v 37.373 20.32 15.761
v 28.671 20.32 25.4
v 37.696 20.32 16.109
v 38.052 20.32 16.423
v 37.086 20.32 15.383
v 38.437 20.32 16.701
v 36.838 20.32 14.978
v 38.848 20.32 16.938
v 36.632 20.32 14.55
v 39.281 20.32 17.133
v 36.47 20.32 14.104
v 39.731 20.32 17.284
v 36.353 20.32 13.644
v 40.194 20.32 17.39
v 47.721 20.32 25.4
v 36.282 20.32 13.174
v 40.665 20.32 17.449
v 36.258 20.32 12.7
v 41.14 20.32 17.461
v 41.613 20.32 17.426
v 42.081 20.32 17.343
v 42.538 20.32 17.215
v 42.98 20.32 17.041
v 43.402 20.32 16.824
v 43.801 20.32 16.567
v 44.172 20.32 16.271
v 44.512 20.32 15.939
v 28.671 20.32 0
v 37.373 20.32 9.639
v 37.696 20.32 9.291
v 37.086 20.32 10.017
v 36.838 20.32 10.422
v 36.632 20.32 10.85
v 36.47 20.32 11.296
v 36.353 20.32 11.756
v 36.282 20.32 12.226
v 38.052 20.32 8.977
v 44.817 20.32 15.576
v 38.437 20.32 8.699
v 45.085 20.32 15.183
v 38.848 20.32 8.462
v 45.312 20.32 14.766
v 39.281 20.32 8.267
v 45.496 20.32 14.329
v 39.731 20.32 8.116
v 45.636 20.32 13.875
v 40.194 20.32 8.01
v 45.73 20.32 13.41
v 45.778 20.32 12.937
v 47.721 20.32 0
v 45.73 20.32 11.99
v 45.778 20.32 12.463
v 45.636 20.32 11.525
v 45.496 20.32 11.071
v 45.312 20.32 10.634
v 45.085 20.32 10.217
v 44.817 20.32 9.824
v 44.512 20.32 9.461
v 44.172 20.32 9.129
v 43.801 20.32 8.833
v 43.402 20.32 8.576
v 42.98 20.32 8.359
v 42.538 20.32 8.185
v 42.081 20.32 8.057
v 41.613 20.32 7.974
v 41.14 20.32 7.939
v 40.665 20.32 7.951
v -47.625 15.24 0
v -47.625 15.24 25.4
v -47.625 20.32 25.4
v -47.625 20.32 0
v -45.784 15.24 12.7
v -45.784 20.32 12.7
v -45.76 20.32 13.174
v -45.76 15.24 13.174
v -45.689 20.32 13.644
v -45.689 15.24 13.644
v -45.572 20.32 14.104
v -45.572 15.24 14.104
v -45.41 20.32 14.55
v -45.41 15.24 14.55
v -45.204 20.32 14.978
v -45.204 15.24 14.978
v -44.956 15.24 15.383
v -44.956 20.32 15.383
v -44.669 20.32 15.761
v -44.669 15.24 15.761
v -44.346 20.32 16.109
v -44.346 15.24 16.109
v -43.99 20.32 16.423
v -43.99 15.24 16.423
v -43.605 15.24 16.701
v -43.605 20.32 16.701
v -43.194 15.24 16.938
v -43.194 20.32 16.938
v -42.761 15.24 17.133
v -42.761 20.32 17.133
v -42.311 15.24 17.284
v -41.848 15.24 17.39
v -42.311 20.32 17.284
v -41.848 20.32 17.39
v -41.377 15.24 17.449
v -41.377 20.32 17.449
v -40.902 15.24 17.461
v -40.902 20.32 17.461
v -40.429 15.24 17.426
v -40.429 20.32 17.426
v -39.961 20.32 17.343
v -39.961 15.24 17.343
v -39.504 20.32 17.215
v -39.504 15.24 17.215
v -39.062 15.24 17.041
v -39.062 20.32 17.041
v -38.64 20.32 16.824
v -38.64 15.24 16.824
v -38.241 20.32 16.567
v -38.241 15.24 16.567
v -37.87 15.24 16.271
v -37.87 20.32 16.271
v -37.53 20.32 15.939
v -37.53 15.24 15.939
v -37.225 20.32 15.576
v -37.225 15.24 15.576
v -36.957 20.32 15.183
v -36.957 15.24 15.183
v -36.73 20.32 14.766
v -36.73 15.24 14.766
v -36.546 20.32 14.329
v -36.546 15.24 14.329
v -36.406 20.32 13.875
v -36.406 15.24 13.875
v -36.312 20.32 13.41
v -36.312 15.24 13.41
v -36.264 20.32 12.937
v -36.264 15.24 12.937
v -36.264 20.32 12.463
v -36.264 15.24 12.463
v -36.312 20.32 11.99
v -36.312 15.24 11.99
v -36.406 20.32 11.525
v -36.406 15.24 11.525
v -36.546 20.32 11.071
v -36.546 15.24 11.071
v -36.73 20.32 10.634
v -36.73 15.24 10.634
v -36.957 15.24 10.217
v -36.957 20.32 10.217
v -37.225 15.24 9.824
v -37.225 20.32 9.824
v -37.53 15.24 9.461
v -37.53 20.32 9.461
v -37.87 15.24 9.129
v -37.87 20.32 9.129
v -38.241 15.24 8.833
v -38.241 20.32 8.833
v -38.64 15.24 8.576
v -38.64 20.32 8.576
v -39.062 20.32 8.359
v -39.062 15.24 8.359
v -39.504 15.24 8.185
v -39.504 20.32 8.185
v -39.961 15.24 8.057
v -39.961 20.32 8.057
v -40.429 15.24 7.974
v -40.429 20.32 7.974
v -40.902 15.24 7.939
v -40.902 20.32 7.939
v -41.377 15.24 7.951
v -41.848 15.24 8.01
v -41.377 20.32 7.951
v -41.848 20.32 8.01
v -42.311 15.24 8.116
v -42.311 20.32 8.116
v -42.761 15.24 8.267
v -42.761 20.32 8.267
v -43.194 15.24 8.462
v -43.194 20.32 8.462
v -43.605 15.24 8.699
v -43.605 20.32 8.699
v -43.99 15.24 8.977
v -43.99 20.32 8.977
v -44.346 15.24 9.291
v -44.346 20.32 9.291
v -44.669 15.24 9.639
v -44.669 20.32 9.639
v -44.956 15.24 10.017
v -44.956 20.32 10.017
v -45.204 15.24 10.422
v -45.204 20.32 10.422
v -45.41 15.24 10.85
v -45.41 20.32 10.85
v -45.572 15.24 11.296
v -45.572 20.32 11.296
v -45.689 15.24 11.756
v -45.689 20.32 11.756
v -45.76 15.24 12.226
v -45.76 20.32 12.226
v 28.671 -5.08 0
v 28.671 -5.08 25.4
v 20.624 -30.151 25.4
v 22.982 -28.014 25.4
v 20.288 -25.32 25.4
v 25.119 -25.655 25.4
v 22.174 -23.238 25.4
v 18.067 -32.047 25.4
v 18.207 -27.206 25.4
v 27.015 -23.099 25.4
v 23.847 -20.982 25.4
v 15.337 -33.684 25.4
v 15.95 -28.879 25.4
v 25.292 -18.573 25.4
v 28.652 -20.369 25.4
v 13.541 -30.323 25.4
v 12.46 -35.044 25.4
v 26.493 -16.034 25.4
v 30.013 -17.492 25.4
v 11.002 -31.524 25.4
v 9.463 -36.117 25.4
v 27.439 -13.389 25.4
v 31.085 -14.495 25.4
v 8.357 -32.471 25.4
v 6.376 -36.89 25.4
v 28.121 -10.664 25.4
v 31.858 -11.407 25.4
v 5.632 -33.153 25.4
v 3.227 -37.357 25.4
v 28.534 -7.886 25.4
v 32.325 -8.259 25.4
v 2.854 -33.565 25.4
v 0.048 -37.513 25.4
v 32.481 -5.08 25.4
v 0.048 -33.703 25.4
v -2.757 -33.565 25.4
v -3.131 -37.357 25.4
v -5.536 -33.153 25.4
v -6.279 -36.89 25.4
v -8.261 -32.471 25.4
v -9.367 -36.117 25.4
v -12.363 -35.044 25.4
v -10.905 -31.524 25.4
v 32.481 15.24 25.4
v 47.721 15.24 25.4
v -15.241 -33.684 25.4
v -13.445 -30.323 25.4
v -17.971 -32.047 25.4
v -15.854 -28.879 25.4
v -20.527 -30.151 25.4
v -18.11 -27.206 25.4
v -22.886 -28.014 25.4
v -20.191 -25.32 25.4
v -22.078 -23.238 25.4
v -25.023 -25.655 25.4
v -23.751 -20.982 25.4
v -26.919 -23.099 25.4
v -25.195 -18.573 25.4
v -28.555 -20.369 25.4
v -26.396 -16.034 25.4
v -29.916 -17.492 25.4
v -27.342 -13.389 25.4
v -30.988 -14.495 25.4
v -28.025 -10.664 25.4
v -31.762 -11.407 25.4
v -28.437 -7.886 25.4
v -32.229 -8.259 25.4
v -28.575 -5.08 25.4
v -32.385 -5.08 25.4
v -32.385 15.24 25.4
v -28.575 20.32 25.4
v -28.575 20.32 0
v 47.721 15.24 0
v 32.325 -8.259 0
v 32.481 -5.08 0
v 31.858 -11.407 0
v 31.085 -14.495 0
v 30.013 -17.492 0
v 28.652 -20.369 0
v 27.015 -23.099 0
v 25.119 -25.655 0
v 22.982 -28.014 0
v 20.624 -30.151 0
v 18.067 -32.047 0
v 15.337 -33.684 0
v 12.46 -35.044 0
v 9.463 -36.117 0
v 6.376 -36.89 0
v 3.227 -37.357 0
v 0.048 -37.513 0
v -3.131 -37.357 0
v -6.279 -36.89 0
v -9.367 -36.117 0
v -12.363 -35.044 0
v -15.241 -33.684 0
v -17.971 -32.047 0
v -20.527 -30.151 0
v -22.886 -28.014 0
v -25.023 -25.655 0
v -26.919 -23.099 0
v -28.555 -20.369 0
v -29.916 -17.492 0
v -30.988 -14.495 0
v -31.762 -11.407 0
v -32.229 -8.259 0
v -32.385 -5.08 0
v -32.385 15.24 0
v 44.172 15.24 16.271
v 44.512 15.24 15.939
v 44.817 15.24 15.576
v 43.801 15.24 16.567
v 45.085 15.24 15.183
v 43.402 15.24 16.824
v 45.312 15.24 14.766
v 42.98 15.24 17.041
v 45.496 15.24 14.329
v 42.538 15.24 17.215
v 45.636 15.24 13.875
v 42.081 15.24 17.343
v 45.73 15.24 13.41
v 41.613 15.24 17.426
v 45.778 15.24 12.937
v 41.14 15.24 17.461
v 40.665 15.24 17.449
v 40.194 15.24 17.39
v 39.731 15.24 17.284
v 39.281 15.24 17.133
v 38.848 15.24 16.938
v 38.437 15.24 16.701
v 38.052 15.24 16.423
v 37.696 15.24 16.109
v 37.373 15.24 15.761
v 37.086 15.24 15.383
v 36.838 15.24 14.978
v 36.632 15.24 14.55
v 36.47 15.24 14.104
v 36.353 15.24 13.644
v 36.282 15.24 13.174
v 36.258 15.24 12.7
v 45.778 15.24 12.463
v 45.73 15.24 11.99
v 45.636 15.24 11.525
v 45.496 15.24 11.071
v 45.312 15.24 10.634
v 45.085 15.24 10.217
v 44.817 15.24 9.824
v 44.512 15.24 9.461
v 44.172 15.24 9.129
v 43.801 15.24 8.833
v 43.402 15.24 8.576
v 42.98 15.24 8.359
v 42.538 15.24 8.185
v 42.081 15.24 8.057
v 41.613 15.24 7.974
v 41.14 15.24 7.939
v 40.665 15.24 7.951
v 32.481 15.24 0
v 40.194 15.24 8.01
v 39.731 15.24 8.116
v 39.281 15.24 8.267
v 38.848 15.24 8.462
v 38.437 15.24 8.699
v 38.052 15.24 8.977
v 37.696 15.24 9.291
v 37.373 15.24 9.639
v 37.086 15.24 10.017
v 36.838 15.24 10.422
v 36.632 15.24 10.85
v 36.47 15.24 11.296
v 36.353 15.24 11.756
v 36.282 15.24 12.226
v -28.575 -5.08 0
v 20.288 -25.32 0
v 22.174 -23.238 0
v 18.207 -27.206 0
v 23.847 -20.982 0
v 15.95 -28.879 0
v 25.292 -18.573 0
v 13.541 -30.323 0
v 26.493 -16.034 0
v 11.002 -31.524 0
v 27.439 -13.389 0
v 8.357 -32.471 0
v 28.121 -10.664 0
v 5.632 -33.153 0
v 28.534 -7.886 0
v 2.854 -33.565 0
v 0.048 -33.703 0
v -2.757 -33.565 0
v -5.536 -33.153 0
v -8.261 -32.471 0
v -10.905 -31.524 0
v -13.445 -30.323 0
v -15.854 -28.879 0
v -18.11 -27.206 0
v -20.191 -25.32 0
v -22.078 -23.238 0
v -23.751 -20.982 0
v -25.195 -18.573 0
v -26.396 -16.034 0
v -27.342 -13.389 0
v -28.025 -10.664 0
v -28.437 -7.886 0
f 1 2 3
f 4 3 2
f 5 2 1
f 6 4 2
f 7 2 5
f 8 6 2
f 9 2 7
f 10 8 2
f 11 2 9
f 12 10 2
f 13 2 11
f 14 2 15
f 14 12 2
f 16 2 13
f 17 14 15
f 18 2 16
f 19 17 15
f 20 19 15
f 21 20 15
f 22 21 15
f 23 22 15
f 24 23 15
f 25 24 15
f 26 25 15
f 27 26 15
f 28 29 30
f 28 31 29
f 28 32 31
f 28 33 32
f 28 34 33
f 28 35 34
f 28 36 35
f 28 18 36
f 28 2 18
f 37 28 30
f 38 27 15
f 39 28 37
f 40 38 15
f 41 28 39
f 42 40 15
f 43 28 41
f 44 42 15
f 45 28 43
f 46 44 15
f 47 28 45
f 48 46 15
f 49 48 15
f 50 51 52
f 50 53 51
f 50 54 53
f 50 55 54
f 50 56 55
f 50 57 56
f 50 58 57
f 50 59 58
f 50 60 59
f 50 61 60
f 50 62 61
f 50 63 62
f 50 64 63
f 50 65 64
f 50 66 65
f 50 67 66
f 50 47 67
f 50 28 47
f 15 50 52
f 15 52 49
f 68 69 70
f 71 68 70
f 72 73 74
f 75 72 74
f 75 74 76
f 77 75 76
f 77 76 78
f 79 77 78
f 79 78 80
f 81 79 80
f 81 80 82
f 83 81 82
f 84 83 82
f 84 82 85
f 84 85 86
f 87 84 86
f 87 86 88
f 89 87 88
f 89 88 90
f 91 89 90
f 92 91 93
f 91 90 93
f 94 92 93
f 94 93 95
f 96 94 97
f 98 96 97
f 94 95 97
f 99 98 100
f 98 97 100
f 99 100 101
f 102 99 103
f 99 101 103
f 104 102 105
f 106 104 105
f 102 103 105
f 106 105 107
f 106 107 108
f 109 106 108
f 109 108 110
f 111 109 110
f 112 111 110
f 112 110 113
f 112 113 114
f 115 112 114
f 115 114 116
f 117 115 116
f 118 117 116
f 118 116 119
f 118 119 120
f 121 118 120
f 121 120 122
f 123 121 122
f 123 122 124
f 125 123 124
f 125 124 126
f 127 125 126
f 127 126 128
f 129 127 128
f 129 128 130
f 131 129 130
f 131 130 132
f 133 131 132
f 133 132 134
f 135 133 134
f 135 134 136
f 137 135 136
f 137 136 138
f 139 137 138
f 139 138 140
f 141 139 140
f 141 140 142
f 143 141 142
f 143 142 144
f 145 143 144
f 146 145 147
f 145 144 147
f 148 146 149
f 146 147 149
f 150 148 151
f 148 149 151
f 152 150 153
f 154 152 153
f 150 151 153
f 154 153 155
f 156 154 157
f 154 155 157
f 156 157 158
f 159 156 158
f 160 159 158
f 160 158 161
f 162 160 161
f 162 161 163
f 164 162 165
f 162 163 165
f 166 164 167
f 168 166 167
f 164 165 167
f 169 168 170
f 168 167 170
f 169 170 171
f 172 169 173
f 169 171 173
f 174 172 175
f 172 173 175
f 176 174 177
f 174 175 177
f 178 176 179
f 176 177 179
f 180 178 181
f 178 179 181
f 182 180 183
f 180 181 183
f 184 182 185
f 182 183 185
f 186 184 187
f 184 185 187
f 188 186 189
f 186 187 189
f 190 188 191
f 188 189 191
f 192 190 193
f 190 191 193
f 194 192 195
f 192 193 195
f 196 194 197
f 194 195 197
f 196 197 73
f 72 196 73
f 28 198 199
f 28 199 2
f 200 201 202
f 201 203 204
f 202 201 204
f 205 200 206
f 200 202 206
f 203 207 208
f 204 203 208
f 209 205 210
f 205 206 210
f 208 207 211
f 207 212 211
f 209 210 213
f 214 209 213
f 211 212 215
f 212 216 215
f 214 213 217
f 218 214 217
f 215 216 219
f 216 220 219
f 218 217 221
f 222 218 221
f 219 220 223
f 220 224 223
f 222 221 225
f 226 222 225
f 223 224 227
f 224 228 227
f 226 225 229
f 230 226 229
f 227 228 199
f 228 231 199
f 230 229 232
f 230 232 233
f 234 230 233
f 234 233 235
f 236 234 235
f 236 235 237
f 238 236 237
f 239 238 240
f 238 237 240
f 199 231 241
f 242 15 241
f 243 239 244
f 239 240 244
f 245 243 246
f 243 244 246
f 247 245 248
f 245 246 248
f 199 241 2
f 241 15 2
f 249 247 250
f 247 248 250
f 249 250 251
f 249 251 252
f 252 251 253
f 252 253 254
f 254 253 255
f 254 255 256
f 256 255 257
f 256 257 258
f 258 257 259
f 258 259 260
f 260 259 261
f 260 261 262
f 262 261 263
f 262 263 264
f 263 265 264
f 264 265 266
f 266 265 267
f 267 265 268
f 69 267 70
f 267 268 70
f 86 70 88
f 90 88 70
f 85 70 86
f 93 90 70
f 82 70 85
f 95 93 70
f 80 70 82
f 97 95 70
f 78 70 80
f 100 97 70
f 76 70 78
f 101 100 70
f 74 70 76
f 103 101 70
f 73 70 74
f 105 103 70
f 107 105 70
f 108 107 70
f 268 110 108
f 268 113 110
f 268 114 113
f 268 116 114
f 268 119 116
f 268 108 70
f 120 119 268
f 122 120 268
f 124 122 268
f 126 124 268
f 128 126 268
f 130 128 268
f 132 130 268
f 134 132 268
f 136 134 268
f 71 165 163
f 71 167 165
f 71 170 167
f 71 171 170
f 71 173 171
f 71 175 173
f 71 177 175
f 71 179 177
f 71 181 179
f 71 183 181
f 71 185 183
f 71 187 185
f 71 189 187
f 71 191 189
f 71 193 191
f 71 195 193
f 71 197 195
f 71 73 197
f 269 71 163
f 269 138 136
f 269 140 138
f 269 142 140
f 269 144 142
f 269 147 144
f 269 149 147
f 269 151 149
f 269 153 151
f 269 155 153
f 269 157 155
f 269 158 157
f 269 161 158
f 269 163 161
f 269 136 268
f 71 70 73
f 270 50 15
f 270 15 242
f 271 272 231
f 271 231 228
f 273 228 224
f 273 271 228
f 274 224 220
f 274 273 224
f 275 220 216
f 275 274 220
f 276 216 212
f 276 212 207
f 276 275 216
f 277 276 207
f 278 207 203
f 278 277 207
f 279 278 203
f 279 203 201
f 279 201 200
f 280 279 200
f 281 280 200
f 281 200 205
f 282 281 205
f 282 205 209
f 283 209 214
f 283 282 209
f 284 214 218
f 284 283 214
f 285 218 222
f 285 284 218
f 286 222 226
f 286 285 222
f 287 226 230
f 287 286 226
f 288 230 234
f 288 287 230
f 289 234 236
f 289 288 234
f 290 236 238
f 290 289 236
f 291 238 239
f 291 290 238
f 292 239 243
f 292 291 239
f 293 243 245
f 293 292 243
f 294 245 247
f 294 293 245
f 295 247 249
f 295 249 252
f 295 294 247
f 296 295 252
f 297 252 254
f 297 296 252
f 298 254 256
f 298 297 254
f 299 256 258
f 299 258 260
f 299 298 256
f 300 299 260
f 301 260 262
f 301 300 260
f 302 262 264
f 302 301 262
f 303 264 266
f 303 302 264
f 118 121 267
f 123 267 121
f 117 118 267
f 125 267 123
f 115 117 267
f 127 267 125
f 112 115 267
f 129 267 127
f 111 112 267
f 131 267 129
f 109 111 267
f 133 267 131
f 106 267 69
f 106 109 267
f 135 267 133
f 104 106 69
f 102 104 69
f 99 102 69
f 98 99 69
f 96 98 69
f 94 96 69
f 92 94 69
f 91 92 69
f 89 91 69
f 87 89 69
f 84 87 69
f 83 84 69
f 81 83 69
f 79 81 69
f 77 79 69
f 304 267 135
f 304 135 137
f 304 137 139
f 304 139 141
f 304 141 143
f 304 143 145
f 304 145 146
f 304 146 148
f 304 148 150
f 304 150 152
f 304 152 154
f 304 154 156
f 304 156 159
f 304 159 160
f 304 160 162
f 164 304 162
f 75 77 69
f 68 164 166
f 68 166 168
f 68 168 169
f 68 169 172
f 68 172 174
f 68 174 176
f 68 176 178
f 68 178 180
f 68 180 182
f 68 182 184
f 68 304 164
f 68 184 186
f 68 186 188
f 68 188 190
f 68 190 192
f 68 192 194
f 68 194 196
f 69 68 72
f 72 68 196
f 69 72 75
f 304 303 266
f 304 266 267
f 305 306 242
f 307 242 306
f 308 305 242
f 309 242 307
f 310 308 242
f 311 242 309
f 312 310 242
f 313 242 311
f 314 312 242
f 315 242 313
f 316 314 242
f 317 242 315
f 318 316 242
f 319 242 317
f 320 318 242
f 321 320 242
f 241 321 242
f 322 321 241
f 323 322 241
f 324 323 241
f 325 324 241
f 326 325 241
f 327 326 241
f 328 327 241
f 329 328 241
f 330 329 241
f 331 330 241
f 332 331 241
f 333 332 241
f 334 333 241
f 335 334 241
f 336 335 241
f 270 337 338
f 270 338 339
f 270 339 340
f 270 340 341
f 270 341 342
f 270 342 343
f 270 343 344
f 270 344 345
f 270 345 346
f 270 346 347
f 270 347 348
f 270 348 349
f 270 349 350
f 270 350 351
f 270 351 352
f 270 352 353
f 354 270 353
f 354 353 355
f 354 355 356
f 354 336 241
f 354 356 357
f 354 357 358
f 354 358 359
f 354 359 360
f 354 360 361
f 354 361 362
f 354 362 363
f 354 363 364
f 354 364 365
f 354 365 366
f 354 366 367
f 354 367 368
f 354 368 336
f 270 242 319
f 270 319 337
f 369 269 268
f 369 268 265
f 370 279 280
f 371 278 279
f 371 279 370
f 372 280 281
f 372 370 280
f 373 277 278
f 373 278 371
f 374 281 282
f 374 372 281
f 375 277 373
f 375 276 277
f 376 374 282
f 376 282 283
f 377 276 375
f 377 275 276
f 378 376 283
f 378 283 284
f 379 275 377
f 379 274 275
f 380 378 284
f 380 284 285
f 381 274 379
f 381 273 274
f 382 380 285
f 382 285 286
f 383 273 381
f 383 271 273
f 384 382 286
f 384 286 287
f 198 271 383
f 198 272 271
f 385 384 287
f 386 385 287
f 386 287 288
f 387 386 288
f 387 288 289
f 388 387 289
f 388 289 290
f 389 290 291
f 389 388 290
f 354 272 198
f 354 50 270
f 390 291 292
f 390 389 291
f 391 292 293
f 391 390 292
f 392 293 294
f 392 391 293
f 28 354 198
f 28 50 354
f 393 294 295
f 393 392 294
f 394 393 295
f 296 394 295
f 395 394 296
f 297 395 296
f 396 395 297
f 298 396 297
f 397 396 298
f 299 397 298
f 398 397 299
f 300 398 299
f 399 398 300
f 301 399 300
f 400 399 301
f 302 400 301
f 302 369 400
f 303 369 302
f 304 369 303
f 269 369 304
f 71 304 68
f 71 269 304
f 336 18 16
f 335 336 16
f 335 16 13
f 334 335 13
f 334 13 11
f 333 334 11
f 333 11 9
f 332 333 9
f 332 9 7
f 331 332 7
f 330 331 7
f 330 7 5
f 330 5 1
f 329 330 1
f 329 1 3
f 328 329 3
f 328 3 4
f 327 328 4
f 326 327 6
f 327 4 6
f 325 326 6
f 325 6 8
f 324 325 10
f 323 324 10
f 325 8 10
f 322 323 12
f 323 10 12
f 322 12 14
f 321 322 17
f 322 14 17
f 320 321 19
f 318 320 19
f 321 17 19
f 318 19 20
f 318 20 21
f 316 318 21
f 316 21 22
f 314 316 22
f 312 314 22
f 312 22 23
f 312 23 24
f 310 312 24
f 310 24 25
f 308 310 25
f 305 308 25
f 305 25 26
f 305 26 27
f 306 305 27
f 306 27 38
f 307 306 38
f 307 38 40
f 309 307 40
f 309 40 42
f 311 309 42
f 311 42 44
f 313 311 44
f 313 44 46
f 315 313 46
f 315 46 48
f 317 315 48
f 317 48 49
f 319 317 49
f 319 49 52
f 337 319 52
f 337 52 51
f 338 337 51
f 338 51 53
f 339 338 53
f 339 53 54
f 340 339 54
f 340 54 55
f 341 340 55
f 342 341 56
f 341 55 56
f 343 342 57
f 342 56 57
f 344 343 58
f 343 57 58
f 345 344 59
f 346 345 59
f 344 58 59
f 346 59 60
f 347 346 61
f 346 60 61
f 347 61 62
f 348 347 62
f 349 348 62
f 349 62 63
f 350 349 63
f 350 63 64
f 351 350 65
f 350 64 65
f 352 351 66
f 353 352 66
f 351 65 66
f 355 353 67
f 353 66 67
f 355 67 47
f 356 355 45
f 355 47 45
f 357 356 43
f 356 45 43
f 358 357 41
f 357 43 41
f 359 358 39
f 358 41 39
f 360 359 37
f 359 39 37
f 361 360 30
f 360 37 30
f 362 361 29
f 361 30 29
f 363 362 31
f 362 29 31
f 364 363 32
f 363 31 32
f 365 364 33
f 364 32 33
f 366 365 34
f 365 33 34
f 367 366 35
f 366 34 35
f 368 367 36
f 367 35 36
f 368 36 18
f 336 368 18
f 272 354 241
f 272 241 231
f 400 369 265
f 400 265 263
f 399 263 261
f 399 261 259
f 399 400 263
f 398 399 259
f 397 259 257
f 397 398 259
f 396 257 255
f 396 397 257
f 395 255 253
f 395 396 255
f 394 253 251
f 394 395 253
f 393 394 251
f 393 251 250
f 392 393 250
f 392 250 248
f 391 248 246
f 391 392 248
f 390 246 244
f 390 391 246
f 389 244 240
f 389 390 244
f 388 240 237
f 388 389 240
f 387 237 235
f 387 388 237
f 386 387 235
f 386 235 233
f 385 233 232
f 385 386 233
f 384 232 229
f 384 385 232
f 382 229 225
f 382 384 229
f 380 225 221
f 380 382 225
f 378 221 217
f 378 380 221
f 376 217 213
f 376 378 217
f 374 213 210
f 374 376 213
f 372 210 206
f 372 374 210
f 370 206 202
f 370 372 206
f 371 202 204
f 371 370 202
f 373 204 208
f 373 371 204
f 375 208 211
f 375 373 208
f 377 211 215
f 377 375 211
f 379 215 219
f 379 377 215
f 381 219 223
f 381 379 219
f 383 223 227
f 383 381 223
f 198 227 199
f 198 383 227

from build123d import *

# Parameters (mm, degrees)
BOSS_EXTRUDE2_DEPTH = 25.4
SKETCH5_R           = 4.7625
CUT_EXTRUDE1_DEPTH  = 38.1


with BuildPart() as part:
    # Sketch4 → Boss-Extrude2 (new body)
    with BuildSketch(Plane.XY):
        with BuildLine():
            Line((-32.385, 15.24), (-47.625, 15.24))
            Line((-47.625, 15.24), (-47.625, 20.32))
            Line((-47.625, 20.32), (-28.575, 20.32))
            Line((-28.575, 20.32), (-28.575, -5.08))
            ThreePointArc((-28.575, -5.08), (0.048187712, -33.703187712), (28.671375425, -5.08))
            Line((28.671375425, -5.08), (28.671375425, 20.32))
            Line((28.671375425, 20.32), (47.721375425, 20.32))
            Line((47.721375425, 20.32), (47.721375425, 15.24))
            Line((47.721375425, 15.24), (32.481375425, 15.24))
            Line((32.481375425, 15.24), (32.481375425, -5.08))
            ThreePointArc((32.481375425, -5.08), (0.048187712, -37.513187712), (-32.385, -5.08))
            Line((-32.385, -5.08), (-32.385, 15.24))
        make_face()
    extrude(amount=BOSS_EXTRUDE2_DEPTH)

    # Sketch5 → Cut-Extrude1 (cut)
    with BuildSketch(Plane(origin=(0, 20.32, 0), x_dir=(1, 0, 0), z_dir=(0, 1, 0))):
        with Locations(Location((-41.021, -12.7, 0), (0, 0, 180))):
            Circle(SKETCH5_R)
        with Locations(Location((41.021, -12.7, 0), (0, 0, 180))):
            Circle(SKETCH5_R)
    extrude(amount=-CUT_EXTRUDE1_DEPTH, mode=Mode.SUBTRACT)


solid = part.part
